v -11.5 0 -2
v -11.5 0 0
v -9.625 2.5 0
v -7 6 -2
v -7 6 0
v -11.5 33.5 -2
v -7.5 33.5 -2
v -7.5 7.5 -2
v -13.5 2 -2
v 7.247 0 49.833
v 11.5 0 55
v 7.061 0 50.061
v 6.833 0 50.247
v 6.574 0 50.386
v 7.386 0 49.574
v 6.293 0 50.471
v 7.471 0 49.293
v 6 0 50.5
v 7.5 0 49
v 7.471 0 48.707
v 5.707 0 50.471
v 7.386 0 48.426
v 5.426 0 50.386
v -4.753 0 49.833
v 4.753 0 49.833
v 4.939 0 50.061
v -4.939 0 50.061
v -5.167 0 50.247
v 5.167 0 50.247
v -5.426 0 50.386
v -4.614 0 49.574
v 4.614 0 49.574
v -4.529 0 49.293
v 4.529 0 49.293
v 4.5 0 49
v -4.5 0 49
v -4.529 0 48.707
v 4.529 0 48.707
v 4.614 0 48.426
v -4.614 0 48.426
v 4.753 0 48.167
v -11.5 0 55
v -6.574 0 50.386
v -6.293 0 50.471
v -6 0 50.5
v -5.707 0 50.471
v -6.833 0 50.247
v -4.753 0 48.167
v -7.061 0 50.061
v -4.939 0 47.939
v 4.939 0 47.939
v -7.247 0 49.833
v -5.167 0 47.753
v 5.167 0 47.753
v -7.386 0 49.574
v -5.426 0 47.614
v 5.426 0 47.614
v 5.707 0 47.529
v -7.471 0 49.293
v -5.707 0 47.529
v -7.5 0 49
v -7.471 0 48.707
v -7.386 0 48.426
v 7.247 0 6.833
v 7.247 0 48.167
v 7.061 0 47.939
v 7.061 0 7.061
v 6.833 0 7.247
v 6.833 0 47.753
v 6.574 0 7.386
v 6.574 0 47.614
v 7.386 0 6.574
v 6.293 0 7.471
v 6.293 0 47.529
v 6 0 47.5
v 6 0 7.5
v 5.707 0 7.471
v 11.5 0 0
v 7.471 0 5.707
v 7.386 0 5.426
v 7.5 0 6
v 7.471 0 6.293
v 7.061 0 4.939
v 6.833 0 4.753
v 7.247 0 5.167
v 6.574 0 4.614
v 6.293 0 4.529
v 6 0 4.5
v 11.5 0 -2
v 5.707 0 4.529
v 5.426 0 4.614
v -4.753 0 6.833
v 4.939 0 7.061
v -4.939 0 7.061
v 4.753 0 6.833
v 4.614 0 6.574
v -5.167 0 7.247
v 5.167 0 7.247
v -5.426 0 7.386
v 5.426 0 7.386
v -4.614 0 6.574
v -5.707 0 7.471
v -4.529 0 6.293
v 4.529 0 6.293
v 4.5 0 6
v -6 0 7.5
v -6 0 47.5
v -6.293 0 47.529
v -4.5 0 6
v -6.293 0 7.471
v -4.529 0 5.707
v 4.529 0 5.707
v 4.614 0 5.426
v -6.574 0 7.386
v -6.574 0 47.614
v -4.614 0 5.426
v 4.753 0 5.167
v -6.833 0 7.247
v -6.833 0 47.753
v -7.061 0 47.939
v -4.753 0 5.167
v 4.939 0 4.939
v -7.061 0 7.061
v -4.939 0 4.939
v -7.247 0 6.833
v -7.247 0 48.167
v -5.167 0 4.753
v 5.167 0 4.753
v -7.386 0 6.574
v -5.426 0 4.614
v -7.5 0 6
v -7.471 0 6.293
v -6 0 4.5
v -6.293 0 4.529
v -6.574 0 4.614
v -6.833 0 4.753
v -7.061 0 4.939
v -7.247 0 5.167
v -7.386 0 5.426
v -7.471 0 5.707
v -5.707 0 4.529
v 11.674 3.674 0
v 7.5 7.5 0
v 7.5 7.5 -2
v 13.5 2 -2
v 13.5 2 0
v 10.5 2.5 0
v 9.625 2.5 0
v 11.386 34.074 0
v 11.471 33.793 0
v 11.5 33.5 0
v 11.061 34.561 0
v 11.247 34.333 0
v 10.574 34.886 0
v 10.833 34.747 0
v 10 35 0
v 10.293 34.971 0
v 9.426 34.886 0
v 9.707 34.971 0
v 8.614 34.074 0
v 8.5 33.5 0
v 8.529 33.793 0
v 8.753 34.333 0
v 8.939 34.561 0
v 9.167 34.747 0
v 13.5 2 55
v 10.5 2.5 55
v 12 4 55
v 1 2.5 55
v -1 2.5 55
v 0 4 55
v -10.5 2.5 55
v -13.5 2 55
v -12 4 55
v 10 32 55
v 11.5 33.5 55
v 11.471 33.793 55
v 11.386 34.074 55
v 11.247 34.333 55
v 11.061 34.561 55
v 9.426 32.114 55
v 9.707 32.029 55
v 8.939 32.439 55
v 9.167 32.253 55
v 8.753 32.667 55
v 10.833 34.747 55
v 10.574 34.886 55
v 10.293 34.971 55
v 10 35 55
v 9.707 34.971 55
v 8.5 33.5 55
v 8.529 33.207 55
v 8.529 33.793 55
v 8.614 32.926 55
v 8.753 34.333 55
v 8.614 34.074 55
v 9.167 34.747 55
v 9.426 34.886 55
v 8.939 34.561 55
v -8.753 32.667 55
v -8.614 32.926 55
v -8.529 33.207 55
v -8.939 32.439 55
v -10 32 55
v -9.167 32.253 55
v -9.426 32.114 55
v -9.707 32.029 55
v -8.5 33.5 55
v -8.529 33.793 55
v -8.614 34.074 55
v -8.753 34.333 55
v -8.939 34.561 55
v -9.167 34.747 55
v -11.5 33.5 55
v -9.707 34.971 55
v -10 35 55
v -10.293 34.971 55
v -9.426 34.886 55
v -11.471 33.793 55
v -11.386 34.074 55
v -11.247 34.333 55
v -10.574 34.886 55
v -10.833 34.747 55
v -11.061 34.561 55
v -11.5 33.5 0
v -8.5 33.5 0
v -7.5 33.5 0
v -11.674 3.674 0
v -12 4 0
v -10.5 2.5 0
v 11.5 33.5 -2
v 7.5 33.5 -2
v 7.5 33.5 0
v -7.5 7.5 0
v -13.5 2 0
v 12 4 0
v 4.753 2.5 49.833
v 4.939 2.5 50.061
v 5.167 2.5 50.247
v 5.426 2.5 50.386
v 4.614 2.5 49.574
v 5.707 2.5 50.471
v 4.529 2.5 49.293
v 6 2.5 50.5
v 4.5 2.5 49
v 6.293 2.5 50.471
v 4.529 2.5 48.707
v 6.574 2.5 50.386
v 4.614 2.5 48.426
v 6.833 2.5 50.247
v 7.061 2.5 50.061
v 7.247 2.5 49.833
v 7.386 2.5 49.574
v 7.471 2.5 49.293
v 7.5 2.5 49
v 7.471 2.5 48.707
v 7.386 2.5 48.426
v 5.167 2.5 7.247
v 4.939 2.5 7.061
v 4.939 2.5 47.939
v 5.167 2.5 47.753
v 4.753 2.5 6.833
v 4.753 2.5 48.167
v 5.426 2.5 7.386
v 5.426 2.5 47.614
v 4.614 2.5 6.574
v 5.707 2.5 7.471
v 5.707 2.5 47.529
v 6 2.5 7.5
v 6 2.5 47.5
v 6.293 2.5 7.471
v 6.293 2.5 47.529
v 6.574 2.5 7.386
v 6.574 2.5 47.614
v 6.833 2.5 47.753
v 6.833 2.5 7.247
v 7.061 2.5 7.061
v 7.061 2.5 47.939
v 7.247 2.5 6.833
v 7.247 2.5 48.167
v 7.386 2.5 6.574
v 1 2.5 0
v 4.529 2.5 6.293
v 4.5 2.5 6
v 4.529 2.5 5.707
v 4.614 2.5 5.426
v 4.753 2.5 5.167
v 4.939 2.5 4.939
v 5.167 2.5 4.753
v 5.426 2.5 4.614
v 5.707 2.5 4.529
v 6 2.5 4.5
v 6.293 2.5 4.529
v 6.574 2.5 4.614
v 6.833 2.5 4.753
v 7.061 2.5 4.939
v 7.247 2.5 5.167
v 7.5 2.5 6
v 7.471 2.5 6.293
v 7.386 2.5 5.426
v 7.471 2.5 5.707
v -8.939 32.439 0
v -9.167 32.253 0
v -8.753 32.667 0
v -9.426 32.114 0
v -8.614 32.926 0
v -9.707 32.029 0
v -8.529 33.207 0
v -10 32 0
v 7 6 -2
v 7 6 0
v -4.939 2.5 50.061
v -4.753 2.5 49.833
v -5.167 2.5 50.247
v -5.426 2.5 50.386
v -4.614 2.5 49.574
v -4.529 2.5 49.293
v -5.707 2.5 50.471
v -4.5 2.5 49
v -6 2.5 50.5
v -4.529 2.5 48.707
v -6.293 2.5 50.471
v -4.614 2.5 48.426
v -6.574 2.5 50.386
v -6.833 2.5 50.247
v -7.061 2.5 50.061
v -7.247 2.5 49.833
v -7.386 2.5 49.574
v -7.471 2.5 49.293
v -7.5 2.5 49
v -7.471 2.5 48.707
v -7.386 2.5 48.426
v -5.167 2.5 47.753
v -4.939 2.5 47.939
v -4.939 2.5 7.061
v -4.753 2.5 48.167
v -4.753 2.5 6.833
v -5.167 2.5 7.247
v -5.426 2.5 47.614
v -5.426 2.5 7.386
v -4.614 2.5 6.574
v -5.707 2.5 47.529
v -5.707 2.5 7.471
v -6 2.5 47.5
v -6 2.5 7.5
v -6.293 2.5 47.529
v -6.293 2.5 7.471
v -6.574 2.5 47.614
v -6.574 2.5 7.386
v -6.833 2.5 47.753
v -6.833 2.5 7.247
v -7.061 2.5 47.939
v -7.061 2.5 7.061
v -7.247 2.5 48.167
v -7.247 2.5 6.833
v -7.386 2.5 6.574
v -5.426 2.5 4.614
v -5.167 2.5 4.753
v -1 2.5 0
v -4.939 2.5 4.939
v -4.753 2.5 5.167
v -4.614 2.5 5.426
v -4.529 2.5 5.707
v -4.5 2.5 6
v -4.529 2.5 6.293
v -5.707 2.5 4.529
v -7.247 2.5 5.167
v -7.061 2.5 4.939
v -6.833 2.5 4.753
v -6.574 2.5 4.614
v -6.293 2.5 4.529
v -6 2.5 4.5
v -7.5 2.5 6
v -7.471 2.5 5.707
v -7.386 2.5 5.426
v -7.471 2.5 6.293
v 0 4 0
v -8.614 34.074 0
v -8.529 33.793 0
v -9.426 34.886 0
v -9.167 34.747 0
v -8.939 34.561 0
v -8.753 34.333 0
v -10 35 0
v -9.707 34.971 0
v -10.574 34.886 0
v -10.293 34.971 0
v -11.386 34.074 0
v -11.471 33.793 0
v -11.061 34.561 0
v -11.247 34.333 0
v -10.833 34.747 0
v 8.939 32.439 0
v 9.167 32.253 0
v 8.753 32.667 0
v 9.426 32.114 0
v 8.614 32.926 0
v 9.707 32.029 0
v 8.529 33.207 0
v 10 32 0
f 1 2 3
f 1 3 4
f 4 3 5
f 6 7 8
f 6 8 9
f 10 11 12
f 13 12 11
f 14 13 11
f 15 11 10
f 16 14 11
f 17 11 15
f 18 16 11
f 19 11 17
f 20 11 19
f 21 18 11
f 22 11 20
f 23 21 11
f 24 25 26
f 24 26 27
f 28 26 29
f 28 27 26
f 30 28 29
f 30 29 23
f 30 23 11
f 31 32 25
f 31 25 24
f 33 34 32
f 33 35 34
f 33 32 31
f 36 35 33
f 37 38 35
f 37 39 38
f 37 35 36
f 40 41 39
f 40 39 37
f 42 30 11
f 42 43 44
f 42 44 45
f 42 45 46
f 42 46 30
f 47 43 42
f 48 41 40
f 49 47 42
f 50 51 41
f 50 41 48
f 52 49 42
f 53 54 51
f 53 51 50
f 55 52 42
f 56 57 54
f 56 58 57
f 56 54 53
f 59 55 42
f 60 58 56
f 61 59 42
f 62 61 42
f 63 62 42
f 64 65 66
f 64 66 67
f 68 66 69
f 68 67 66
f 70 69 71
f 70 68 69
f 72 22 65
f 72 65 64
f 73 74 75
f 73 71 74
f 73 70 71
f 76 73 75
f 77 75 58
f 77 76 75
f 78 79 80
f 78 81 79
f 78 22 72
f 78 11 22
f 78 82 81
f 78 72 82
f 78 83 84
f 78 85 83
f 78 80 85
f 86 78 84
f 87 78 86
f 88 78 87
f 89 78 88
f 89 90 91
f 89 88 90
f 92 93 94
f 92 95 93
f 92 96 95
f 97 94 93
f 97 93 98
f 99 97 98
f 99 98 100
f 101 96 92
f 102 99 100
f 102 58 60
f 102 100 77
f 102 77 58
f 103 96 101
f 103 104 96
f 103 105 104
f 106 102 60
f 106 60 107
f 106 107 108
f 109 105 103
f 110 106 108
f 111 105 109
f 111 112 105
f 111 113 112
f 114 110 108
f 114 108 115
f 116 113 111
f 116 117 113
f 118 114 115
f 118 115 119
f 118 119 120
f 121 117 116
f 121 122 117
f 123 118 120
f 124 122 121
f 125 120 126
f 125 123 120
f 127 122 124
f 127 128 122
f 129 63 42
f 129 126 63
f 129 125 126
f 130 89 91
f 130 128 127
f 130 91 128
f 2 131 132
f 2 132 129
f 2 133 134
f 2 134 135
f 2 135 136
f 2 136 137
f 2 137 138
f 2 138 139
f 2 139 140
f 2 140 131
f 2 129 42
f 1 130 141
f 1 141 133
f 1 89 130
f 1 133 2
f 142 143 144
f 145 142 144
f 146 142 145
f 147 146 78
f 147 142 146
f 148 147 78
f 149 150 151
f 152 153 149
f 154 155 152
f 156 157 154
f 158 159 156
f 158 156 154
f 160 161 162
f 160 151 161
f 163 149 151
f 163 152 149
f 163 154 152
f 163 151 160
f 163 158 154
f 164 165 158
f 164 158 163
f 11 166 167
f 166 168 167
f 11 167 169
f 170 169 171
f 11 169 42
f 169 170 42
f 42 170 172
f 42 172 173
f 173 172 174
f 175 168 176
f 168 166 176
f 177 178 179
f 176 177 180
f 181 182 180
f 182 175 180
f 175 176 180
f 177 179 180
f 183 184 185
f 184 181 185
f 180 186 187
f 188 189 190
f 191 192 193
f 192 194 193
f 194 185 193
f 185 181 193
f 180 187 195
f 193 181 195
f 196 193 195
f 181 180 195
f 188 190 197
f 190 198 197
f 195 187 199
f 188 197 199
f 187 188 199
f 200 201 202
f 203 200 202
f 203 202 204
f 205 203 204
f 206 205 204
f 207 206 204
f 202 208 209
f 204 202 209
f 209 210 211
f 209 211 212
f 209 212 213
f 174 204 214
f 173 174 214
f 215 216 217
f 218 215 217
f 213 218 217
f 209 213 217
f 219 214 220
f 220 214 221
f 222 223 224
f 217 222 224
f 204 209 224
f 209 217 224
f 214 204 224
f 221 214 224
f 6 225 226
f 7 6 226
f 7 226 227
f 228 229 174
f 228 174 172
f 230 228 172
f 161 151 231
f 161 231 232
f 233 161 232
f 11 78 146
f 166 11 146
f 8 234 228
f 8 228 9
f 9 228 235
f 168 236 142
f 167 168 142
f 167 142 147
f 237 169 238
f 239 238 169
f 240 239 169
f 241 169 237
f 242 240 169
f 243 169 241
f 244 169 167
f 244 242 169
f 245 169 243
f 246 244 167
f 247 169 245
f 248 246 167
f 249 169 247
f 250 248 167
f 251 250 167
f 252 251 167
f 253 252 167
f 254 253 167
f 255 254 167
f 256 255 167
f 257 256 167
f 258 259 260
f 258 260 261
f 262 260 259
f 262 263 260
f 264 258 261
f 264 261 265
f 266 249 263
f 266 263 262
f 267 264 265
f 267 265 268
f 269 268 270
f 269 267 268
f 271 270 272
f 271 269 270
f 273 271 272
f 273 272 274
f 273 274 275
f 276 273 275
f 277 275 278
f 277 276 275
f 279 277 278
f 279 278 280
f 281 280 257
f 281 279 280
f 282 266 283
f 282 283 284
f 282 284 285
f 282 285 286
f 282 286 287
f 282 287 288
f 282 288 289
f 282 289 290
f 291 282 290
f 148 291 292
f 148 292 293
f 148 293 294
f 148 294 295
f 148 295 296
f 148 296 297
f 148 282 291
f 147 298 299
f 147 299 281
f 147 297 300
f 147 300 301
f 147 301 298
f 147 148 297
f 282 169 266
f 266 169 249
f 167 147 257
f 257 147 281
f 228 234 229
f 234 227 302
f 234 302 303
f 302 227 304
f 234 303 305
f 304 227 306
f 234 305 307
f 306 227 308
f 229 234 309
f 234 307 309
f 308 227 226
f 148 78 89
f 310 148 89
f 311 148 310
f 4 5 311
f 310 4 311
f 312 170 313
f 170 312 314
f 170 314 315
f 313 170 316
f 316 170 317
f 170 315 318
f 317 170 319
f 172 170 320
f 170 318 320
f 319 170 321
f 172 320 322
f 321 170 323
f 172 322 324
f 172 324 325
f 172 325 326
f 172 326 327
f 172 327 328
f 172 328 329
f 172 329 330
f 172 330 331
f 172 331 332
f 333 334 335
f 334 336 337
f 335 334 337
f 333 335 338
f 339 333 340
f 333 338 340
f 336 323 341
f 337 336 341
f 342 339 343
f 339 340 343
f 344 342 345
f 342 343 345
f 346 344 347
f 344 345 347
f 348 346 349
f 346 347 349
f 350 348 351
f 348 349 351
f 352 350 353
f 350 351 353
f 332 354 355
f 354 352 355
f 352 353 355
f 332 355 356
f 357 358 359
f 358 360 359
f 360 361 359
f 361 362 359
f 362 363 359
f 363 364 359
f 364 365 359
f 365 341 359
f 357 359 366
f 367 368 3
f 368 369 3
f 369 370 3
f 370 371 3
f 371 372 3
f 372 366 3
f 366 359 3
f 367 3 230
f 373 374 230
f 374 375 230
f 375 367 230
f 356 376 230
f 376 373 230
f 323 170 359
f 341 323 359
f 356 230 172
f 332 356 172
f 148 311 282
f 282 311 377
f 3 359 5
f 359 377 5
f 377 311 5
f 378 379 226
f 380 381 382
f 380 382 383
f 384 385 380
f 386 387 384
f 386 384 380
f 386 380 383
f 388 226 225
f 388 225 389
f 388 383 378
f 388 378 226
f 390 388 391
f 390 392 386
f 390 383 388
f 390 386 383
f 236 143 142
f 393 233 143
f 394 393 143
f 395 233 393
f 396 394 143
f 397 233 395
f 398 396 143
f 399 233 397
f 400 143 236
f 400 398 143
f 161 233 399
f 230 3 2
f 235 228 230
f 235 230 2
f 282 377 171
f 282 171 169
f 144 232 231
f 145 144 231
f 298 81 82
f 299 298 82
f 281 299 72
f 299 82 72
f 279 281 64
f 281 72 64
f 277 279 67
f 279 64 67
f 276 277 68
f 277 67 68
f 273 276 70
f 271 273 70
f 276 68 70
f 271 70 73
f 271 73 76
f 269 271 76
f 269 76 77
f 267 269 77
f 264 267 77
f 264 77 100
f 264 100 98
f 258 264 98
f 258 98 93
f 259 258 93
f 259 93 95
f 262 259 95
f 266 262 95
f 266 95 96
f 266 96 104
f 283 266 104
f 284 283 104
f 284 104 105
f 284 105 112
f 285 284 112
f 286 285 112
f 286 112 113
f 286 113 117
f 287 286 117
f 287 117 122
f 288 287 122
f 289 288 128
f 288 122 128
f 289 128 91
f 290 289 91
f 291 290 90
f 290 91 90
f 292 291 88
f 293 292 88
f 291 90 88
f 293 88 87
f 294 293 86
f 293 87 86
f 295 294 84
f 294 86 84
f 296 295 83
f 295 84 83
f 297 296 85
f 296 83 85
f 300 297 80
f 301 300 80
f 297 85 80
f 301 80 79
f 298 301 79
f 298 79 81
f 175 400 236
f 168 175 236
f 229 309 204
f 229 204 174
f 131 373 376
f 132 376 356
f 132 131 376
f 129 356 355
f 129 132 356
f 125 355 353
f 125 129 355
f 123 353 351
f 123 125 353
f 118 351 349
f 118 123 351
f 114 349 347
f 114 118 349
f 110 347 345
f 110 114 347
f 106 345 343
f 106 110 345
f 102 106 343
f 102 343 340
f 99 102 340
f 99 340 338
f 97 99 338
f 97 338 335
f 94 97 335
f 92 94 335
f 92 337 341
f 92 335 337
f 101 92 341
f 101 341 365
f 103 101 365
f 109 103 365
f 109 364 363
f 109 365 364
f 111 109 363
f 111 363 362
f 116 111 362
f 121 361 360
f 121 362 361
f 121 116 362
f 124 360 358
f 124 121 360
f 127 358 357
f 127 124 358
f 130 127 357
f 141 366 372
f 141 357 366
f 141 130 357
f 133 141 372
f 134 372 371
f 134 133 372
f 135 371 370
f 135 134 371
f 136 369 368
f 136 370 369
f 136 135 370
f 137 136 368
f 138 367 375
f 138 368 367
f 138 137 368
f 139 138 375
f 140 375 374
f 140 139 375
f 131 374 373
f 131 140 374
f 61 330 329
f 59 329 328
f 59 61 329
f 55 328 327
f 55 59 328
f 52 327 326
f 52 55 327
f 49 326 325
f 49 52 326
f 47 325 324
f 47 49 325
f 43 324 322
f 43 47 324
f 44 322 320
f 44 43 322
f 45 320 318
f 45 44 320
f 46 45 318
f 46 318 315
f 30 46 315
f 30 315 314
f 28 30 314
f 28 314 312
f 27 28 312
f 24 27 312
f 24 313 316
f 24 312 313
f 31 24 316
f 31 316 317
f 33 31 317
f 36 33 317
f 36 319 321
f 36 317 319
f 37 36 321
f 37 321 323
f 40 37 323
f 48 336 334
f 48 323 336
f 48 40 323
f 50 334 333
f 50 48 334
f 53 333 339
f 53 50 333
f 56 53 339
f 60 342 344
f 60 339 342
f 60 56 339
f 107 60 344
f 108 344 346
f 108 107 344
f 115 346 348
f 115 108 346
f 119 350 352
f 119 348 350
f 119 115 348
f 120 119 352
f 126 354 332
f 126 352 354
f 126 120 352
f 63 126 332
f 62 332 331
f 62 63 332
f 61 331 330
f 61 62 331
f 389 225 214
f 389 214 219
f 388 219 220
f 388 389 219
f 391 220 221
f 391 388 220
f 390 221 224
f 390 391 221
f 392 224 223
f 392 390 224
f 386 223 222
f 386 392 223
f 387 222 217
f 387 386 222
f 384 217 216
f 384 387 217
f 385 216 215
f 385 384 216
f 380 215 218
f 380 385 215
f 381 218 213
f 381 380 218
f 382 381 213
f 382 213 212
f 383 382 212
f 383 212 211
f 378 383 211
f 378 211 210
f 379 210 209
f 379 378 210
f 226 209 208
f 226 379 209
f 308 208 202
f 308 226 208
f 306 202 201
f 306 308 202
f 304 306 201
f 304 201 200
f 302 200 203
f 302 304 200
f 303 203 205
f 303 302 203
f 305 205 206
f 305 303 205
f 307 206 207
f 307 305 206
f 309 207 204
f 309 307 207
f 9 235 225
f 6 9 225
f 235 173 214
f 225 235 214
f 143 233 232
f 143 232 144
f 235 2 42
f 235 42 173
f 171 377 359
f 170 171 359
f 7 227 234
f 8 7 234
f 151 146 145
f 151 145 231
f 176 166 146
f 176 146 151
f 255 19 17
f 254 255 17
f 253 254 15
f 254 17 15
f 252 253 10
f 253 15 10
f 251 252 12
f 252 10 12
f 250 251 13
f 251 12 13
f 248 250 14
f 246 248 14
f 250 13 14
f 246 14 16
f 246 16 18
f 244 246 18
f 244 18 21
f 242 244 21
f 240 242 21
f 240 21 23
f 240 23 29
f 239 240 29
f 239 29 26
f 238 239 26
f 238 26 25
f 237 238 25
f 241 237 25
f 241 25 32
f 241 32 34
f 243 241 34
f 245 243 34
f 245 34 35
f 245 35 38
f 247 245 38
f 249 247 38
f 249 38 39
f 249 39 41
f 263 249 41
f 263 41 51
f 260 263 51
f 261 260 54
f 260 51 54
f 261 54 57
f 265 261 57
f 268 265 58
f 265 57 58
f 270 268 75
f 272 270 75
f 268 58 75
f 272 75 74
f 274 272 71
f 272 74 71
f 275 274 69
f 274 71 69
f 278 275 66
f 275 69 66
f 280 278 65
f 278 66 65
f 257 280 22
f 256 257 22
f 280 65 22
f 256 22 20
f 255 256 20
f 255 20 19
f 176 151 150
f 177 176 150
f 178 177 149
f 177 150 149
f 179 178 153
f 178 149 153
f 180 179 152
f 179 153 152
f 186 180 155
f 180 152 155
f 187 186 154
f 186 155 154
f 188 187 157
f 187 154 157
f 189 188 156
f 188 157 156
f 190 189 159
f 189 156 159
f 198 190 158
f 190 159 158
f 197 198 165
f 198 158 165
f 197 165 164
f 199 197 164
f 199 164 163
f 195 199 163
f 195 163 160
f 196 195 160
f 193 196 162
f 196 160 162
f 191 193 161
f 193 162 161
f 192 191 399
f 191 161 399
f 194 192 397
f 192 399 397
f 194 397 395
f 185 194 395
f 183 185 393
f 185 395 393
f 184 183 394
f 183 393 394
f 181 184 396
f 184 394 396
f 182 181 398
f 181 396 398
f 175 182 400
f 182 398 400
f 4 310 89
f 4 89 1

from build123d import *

# Parameters (mm, degrees)
PAD_DEPTH    = 55
PAD001_DEPTH = 2
SKETCH001_R  = 1.5
POCKET_DEPTH = 179.264648


with BuildPart() as part:
    # Sketch → Pad (new body)
    with BuildSketch(Plane.XY):
        with BuildLine():
            Line((11.5, 0), (13.5, 2))
            Line((13.5, 2), (11.5, 33.5))
            ThreePointArc((11.5, 33.5), (8.93934, 34.56066), (10, 32))
            Line((10, 32), (12, 4))
            Line((12, 4), (10.5, 2.5))
            Line((1, 2.5), (10.5, 2.5))
            Line((0, 4), (1, 2.5))
            Line((0, 4), (0, 0))
            Line((0, 0), (11.5, 0))
        make_face()
    pad = extrude(amount=PAD_DEPTH)

    # Mirrored: Pad across Sketch V_Axis
    add(pad.mirror(Plane(origin=(0, 0, 0), x_dir=(0, 0, 1), z_dir=(1, 0, 0))))

    # Sketch002 → Pad001 (join)
    with BuildSketch(Plane.XY):
        Polygon((11.5, 33.5), (7.5, 33.5), (7.5, 7.5), (13.5, 2), align=None)
        Polygon((11.5, 0), (7, 6), (0, 6), (0, 0), align=None)
    pad001 = extrude(amount=-PAD001_DEPTH)

    # Mirrored001: Pad001 across Sketch002 V_Axis
    add(pad001.mirror(Plane(origin=(0, 0, 0), x_dir=(0, 0, 1), z_dir=(1, 0, 0))))

    # Sketch001 → Pocket (cut, through all)
    with BuildSketch(Plane.XZ):
        with Locations((6, 6)):
            Circle(SKETCH001_R)
        with Locations((6, 49)):
            Circle(SKETCH001_R)
    pocket = extrude(amount=-POCKET_DEPTH, mode=Mode.SUBTRACT)

    # Mirrored002: Pocket across Sketch001 V_Axis
    add(pocket.mirror(Plane(origin=(0, 0, 0), x_dir=(0, -1, 0), z_dir=(1, 0, 0))), mode=Mode.SUBTRACT)


solid = part.part
